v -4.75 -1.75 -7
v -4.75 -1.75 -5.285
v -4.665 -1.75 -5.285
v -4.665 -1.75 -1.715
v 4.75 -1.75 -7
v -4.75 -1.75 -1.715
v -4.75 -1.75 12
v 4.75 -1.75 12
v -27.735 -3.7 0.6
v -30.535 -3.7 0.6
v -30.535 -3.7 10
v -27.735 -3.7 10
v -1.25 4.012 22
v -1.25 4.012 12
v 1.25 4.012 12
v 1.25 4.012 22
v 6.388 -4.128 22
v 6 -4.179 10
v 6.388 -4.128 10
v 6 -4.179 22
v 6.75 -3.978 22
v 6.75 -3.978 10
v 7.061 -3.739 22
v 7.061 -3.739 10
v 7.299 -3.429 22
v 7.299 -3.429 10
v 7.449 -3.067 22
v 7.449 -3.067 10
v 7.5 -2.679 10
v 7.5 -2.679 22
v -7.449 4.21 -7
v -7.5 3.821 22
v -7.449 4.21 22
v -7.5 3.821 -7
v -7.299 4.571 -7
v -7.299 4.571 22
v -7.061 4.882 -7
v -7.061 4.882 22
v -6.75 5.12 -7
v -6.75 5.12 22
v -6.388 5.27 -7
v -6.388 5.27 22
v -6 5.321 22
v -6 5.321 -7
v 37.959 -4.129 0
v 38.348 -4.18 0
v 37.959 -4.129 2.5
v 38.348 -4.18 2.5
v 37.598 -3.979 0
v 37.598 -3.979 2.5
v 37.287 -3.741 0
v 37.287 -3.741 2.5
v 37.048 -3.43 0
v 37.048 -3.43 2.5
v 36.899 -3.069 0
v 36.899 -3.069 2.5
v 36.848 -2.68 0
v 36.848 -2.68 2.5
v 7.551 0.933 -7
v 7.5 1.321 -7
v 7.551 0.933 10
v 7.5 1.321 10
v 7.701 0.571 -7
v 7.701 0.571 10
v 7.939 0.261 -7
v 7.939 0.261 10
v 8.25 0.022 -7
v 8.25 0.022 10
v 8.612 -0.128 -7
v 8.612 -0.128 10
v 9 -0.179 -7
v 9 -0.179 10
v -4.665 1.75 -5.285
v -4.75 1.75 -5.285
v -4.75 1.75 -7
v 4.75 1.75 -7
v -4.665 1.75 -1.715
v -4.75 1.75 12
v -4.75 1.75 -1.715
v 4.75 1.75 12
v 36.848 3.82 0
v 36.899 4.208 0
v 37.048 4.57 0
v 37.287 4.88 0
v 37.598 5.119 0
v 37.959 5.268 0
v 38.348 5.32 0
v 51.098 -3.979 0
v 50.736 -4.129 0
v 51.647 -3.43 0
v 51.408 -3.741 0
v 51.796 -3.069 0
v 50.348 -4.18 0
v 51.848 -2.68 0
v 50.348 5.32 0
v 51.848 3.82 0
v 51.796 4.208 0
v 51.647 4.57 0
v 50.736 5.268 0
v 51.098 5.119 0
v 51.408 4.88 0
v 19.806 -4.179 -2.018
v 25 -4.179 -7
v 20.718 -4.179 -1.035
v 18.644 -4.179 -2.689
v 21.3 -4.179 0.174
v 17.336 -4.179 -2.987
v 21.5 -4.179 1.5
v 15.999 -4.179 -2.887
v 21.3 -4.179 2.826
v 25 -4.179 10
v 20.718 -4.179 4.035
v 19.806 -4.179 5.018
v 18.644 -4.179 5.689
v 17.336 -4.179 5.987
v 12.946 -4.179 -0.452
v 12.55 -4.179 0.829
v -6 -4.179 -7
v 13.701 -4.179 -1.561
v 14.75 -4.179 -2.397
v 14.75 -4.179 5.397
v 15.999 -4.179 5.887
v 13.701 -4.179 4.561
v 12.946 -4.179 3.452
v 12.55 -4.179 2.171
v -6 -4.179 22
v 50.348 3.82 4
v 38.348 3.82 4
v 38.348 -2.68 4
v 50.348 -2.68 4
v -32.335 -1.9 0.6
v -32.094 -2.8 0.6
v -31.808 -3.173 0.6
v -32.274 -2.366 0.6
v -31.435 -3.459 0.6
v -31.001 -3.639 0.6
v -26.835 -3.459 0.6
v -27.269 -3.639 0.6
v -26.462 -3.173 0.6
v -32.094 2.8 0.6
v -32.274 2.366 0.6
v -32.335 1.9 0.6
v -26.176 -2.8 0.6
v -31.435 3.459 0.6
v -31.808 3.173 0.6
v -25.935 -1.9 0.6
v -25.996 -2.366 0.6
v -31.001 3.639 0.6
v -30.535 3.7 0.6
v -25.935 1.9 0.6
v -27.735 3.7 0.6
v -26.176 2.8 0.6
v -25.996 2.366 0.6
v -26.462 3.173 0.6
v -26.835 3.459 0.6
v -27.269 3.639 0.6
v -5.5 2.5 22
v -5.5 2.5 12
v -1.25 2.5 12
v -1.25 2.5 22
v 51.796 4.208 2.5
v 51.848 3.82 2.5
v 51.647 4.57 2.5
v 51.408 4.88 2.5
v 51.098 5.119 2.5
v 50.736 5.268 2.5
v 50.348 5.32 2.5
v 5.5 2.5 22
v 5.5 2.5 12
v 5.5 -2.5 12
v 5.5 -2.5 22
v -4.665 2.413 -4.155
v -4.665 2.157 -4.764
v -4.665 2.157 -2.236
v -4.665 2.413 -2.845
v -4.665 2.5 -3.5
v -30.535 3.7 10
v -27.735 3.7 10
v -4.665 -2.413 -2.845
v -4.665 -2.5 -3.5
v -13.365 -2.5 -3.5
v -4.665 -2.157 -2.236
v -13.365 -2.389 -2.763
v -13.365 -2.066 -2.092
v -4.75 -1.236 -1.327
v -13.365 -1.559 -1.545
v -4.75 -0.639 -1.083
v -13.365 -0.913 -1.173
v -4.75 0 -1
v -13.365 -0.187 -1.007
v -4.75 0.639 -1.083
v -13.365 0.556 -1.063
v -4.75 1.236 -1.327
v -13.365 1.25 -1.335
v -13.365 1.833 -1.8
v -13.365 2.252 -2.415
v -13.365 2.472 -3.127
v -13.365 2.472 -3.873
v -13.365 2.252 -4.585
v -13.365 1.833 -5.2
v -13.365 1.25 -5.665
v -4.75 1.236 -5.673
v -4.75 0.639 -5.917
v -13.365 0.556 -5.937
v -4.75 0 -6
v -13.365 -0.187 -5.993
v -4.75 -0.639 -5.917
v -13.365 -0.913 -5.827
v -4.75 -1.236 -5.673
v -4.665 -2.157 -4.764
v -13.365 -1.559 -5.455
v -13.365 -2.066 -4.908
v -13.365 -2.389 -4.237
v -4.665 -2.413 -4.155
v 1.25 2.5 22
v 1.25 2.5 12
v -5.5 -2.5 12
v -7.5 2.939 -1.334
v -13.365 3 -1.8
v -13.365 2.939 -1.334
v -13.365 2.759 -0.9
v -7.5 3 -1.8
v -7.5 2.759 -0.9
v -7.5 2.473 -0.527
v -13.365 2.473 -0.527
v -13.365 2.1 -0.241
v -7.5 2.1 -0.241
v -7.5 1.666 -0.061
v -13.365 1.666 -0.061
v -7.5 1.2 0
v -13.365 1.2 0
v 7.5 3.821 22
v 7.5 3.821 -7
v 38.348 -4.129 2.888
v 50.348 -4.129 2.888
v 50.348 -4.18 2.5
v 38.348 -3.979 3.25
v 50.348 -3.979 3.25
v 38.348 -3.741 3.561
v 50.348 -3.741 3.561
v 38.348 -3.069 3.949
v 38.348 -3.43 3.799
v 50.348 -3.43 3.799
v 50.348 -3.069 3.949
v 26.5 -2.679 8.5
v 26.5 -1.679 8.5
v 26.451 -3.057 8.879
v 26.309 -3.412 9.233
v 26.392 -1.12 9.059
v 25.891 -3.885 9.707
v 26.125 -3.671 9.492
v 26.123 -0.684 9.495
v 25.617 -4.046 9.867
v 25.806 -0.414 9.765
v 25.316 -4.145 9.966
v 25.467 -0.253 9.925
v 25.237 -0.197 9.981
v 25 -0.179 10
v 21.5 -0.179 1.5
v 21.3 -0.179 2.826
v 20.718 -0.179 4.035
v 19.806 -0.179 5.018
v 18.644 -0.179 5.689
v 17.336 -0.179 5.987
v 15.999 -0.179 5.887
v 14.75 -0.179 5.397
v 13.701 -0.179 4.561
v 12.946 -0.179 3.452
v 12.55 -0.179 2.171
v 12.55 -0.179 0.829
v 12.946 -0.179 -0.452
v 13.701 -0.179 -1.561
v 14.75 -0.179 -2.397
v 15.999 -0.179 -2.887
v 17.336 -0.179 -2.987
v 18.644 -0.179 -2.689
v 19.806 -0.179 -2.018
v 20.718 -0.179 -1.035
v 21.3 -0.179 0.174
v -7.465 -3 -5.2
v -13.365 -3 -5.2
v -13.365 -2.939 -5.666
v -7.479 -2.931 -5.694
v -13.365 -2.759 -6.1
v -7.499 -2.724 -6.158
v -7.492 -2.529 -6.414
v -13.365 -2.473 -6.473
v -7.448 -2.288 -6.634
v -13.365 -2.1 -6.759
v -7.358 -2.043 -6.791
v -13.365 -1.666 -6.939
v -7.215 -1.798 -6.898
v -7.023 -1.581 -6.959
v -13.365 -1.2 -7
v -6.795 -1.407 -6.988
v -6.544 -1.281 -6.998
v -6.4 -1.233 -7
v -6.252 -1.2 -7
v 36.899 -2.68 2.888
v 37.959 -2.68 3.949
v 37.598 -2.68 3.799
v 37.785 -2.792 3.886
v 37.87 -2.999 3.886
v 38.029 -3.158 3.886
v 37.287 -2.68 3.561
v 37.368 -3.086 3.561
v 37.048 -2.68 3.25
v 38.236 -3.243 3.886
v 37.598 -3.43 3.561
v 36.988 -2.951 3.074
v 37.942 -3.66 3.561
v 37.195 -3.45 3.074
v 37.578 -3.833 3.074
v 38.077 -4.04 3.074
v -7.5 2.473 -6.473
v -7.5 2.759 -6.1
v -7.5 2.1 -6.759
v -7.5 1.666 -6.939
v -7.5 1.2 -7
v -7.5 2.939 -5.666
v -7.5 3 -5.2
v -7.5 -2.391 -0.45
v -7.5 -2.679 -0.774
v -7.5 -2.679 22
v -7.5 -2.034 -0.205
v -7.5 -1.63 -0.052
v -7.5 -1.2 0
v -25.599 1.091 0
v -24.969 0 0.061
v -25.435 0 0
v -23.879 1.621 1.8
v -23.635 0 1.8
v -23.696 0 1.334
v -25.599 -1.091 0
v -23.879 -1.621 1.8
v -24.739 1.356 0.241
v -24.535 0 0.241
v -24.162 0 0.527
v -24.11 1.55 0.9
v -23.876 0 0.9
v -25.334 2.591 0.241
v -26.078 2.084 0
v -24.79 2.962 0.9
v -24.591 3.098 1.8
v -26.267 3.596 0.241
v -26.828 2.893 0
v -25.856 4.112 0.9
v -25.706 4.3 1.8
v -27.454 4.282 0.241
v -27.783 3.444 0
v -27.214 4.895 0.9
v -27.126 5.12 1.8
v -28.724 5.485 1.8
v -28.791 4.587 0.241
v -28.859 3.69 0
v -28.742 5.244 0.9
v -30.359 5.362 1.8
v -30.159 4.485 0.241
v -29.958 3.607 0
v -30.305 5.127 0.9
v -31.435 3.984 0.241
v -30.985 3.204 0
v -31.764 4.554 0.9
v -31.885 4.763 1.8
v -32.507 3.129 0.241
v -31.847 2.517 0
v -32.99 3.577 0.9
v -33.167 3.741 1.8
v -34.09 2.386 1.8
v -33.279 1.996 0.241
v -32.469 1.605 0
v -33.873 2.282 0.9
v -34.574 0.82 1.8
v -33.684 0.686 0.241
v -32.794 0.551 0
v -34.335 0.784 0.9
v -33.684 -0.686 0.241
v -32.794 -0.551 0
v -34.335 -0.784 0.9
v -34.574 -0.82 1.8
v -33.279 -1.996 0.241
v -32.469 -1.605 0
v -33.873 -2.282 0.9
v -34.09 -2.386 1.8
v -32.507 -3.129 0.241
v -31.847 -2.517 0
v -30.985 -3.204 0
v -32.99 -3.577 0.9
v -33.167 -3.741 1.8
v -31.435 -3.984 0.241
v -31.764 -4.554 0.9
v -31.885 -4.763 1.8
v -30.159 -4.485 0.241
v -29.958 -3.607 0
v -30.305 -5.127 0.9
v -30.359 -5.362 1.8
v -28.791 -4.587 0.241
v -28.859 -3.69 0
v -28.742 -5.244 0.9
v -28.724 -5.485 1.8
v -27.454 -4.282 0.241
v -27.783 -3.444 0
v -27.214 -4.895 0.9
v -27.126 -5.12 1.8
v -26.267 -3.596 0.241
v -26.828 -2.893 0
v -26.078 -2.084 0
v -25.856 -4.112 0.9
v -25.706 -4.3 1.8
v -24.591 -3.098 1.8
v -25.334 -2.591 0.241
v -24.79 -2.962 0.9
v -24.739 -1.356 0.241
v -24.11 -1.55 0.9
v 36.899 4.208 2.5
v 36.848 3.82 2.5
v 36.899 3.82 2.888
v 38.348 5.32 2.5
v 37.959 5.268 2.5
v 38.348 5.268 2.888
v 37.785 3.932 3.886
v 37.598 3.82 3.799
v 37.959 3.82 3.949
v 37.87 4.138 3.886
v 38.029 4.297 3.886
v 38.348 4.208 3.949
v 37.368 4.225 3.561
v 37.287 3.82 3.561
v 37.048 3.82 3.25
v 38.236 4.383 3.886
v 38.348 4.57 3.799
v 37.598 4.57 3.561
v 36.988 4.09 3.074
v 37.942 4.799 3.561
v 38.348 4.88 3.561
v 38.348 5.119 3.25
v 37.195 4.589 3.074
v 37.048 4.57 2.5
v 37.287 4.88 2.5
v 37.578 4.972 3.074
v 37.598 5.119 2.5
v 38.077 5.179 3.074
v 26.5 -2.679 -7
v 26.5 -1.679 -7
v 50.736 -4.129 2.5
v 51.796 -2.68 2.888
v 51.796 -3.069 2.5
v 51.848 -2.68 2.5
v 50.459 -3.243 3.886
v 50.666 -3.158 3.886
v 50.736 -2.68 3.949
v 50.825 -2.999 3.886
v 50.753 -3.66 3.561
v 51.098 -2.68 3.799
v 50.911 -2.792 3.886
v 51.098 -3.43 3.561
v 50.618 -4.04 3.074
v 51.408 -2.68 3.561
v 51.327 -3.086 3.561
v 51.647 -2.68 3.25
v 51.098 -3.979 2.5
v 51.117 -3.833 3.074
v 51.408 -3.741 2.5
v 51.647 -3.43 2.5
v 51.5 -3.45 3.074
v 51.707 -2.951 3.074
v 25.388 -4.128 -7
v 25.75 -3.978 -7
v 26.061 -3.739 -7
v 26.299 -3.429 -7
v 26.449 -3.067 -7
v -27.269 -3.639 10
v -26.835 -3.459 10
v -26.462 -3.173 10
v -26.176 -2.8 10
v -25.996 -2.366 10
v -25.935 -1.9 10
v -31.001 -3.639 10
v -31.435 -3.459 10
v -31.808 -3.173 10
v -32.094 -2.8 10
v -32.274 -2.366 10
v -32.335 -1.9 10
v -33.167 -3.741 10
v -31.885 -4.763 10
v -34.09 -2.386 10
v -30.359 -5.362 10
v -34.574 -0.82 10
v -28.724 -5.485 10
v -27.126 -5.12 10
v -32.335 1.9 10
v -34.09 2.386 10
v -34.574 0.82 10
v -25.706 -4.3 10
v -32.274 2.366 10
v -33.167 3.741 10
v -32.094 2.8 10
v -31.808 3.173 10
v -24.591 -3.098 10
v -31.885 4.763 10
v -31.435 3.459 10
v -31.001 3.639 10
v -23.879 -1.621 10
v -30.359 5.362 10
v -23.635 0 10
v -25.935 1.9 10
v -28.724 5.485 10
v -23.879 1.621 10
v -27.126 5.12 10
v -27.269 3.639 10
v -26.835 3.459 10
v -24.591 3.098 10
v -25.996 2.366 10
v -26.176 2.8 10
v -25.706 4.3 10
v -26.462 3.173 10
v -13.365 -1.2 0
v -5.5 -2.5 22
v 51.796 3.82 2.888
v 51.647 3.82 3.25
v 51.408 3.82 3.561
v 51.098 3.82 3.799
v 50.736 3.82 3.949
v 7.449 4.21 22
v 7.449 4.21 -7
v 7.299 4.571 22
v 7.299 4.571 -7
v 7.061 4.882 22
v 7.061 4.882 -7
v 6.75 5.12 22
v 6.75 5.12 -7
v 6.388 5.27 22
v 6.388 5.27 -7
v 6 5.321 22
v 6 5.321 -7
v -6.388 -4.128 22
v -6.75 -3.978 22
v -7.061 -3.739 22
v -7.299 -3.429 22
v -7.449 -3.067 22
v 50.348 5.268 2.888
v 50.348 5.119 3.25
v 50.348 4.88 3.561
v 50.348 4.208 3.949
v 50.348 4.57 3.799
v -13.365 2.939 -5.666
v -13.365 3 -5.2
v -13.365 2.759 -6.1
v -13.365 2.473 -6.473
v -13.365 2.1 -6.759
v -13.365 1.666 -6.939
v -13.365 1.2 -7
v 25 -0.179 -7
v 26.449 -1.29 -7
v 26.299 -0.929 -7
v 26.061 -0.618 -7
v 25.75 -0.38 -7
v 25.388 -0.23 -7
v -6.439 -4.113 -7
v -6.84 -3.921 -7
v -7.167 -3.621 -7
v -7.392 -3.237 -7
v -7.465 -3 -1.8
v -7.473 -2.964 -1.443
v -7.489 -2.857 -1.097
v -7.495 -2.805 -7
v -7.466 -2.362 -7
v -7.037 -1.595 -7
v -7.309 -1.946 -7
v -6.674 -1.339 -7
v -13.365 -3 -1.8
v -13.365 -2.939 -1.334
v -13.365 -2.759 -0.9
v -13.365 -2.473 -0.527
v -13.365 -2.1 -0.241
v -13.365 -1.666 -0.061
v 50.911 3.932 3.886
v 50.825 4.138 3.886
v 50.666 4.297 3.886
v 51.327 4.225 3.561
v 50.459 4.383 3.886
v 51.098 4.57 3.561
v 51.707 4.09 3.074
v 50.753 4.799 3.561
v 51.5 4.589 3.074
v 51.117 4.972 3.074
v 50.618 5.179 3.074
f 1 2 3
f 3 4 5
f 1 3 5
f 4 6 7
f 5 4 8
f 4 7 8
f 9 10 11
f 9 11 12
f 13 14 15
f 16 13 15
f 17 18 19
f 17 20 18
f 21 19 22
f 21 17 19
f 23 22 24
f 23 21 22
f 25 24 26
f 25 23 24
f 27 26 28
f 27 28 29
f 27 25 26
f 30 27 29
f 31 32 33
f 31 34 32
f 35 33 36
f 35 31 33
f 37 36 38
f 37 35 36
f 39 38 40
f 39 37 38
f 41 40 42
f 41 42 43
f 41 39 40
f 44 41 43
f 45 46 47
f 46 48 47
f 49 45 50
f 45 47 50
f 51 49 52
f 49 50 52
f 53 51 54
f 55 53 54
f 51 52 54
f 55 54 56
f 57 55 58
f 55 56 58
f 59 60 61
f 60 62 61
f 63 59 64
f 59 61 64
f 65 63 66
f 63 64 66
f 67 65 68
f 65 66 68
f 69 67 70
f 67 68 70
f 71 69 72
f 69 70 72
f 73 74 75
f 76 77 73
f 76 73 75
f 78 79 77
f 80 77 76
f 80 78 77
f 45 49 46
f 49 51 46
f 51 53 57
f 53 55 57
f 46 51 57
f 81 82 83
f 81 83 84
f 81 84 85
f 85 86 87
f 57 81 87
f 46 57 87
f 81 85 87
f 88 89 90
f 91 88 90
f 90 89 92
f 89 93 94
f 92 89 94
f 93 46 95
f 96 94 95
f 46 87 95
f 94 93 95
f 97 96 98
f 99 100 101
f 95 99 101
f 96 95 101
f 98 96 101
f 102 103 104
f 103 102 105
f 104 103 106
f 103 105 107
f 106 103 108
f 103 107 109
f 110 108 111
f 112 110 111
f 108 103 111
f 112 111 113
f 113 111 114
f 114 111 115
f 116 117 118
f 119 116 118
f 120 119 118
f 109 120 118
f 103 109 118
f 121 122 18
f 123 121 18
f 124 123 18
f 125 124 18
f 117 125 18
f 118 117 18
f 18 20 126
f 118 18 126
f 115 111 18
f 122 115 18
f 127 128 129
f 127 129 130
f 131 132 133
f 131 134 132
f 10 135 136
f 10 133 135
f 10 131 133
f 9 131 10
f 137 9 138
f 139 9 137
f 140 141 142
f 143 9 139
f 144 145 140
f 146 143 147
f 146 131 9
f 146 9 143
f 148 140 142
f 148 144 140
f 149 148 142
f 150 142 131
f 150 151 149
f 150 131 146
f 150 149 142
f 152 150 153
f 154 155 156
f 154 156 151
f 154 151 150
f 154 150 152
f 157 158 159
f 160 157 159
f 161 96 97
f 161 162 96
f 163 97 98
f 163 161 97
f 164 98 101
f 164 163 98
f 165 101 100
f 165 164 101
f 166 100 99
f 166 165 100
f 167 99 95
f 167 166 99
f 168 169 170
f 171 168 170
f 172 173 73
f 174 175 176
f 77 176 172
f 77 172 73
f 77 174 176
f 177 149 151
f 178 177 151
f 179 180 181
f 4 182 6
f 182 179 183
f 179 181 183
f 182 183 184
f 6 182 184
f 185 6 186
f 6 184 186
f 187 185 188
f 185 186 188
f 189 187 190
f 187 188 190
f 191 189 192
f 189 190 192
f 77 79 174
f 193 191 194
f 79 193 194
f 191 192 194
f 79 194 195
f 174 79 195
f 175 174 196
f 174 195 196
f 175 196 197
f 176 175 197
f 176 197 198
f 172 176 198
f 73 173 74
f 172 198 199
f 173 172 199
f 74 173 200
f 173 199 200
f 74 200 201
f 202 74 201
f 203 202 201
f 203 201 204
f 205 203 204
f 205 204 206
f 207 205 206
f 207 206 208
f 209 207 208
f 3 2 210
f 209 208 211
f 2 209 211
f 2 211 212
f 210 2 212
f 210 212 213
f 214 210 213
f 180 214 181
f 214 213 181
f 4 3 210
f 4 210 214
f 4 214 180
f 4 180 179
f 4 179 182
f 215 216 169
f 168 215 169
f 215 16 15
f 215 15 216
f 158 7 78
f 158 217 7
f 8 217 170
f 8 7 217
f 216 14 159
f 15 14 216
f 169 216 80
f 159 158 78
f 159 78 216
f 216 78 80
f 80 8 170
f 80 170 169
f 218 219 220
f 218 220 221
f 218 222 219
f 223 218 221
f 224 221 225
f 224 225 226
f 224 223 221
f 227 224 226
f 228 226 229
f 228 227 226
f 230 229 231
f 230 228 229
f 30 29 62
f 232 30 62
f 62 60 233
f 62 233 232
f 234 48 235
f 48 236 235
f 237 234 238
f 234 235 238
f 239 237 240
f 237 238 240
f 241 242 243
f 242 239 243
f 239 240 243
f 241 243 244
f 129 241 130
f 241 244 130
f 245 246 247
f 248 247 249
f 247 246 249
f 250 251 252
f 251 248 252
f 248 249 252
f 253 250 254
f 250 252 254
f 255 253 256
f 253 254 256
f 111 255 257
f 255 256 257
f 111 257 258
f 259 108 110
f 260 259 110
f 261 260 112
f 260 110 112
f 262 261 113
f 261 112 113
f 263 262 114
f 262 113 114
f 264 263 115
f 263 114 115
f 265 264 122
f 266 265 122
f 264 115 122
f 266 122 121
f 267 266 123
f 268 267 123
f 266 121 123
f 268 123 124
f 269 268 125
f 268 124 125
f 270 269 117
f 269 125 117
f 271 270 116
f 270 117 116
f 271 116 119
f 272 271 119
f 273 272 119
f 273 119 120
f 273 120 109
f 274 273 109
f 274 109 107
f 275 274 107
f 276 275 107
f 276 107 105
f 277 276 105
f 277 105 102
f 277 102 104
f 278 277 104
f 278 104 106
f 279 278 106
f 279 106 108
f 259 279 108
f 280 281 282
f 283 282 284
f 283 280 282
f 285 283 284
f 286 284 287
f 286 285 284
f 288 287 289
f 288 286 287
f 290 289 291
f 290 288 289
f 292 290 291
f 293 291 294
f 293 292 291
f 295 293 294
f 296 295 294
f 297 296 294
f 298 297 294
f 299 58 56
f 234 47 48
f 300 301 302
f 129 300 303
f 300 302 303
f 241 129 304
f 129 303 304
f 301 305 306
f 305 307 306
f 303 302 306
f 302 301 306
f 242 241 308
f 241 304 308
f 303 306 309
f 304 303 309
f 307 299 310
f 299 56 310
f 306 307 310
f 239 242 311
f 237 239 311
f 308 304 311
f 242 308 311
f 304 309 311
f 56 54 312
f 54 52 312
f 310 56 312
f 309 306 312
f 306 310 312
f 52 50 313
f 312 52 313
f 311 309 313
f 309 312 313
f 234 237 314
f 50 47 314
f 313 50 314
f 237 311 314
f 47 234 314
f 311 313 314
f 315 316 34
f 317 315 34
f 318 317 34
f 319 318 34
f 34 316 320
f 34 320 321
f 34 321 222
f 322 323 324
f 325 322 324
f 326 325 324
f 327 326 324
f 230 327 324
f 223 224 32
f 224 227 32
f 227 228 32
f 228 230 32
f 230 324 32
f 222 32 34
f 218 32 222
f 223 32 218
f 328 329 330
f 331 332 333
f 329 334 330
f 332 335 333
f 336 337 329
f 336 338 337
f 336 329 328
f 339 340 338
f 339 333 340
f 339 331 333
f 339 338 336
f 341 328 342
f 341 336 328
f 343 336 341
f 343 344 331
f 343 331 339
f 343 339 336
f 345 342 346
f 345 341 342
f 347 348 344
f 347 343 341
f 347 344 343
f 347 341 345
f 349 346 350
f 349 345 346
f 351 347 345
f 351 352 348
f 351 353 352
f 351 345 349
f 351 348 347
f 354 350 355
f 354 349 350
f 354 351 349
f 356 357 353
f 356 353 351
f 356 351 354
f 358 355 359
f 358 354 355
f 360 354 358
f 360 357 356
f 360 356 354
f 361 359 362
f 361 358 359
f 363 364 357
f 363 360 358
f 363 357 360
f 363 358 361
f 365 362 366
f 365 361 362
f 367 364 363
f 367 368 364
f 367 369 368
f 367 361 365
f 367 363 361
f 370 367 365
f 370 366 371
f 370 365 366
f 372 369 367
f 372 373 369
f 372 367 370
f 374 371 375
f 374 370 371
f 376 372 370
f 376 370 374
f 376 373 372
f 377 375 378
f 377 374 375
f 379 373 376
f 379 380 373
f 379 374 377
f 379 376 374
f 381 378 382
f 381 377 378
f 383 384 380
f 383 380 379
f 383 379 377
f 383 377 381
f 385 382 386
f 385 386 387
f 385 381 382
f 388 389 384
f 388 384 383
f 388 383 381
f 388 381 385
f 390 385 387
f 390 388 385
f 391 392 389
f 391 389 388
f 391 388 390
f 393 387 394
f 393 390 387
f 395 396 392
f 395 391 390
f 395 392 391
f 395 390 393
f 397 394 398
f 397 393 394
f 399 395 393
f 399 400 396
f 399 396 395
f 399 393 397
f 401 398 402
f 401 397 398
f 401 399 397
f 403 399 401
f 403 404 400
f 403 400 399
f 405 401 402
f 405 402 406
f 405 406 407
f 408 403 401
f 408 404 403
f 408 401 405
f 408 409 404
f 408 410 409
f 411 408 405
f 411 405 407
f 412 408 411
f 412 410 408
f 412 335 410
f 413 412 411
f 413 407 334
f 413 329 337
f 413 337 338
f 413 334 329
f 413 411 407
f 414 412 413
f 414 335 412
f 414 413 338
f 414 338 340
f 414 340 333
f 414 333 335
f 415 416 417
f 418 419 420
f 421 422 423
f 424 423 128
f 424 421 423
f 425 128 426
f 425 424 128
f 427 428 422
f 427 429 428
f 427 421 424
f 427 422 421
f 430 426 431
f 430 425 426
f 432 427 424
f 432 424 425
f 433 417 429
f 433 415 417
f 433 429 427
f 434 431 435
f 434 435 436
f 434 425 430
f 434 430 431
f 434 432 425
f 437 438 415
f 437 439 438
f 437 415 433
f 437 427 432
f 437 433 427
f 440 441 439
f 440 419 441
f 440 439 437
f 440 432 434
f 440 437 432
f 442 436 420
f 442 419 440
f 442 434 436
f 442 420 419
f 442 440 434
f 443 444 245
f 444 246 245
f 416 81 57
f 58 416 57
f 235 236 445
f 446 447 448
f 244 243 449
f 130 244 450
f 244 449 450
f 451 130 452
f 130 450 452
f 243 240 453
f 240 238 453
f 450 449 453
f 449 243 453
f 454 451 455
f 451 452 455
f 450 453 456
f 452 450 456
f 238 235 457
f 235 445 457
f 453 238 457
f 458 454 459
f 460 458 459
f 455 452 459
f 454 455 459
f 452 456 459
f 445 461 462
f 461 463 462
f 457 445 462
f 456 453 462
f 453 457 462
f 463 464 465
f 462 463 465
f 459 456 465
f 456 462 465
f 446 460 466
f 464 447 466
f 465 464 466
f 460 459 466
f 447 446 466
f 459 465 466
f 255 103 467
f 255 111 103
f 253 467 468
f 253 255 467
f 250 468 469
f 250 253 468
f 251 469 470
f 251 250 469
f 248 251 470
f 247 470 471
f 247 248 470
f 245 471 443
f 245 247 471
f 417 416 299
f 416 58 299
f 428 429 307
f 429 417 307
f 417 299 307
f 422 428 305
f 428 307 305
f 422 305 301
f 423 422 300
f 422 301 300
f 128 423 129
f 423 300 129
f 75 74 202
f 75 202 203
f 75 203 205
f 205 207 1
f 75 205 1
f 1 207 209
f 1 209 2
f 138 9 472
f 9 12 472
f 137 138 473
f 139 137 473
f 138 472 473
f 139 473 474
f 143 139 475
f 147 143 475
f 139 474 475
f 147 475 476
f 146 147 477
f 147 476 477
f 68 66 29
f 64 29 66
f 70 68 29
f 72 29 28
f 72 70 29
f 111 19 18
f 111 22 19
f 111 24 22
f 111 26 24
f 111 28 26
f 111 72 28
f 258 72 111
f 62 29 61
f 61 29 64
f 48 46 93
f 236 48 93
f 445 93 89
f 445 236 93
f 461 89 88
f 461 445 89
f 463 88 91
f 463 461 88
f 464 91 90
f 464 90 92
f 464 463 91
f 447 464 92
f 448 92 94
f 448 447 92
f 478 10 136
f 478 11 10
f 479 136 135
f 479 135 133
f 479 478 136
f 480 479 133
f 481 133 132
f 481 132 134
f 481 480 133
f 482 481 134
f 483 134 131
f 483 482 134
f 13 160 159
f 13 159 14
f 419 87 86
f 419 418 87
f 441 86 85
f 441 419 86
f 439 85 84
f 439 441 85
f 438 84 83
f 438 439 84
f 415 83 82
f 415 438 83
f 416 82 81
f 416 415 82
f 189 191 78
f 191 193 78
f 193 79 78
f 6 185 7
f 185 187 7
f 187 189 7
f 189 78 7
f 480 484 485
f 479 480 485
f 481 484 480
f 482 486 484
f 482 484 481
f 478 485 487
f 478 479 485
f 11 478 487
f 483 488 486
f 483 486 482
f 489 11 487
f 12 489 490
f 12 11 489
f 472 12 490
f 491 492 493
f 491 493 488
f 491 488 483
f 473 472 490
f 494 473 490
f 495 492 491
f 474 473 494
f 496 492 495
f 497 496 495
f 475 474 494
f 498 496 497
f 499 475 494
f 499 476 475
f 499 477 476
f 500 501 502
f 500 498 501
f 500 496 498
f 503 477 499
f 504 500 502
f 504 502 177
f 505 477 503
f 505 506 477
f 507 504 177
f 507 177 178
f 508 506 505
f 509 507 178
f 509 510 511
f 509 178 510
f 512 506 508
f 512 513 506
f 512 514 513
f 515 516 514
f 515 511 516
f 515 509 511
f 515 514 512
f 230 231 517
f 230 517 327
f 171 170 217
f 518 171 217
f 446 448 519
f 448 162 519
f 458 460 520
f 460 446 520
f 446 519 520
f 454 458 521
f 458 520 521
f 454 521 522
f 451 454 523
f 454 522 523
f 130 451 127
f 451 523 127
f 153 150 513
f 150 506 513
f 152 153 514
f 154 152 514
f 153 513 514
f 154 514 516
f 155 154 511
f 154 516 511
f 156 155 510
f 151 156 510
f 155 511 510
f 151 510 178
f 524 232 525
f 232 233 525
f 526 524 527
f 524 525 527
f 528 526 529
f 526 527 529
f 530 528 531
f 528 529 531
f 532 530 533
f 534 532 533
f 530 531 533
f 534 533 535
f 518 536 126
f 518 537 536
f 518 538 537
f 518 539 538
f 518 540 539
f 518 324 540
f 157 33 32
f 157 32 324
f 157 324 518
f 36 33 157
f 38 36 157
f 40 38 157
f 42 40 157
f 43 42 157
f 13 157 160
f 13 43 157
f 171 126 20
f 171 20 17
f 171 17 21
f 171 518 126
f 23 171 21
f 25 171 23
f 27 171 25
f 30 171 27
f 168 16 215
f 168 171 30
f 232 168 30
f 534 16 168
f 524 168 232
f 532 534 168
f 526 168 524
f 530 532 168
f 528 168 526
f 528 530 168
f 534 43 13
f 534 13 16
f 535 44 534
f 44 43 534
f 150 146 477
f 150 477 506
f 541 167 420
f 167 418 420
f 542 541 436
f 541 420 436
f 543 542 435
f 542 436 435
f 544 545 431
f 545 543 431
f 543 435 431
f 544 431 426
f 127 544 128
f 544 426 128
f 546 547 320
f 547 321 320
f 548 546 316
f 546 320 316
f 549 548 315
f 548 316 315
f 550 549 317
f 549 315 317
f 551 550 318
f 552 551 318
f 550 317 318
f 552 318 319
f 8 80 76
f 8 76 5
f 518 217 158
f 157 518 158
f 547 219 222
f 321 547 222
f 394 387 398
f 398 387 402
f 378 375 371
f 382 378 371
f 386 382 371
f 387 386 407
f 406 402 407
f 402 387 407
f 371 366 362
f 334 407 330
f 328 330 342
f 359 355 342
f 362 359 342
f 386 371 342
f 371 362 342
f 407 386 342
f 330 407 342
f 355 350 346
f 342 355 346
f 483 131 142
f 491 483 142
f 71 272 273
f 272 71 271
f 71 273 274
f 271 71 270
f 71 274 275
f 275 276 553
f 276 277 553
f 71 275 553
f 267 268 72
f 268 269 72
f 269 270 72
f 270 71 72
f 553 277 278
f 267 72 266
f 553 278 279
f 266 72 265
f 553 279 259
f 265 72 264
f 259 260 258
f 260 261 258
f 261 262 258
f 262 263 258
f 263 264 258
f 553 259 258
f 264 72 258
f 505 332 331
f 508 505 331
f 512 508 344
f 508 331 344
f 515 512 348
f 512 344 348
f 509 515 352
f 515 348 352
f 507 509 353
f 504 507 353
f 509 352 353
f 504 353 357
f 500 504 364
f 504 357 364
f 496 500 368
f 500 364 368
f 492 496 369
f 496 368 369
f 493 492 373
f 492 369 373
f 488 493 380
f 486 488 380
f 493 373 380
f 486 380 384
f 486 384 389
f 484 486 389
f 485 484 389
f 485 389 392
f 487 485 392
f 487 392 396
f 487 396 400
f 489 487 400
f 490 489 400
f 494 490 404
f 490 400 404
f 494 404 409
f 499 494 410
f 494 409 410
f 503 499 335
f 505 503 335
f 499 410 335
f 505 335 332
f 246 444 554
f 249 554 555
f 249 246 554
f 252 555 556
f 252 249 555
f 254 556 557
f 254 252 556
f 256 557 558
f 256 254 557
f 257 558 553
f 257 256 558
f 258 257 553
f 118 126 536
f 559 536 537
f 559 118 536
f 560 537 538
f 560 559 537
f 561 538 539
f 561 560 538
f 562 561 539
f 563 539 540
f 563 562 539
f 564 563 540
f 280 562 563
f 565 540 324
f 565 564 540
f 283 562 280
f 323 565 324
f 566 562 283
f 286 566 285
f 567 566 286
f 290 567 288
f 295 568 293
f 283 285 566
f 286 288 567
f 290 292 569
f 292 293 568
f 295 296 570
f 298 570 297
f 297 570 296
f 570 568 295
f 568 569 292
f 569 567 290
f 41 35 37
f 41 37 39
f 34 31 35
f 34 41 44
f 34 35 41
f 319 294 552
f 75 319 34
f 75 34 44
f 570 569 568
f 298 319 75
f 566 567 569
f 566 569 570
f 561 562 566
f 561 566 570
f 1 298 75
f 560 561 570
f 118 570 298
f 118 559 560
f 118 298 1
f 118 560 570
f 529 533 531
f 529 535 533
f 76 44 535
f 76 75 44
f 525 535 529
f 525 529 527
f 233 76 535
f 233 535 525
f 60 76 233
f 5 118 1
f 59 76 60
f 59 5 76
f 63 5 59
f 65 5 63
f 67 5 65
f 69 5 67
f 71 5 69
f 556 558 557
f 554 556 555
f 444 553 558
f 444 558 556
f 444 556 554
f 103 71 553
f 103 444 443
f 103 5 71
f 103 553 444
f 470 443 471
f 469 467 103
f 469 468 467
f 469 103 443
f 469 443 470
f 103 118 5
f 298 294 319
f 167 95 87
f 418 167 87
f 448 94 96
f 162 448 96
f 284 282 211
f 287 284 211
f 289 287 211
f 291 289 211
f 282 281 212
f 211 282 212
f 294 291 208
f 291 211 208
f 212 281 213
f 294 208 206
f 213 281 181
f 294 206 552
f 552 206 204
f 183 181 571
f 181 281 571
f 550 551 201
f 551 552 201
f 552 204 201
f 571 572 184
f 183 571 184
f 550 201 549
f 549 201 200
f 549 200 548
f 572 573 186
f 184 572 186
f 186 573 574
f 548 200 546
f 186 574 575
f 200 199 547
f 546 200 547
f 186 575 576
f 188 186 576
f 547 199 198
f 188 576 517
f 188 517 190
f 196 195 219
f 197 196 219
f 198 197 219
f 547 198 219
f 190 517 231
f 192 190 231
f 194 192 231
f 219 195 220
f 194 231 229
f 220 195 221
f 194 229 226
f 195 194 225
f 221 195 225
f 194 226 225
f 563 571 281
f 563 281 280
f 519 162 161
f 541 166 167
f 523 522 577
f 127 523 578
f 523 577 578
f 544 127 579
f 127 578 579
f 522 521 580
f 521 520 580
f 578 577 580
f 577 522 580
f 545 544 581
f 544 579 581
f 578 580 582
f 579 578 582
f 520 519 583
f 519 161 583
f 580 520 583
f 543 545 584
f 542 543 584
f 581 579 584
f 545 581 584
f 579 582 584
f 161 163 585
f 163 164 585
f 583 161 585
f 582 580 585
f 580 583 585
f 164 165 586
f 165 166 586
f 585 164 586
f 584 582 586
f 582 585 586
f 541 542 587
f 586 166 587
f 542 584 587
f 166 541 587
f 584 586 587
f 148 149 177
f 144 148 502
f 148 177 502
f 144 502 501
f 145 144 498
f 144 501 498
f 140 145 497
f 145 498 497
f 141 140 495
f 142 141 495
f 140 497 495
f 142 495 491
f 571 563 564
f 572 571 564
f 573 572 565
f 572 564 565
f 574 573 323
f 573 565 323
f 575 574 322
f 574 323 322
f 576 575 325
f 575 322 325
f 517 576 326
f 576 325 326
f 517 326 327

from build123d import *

# Parameters (mm, degrees)
F1_DEPTH  = 22
F0_W      = 9.5
F0_H      = 3.5
F2_DEPTH  = 12
F0_W_2    = 19
F0_H_2    = 4
F3_DEPTH  = 10
F3_FACE_W = 9.5
F3_FACE_H = 3.5
F4_DEPTH  = 7
F5_R      = 4.5
F6_DEPTH  = 25
F0_W_3    = 5.865
F0_H_3    = 6
F7_DEPTH  = 7
F8_R      = 1.5
F9_R      = 1.8
F10_R     = 2.5
F11_DEPTH = 8.7
F12_R     = 5.5
F12_W     = 6.4
F12_H     = 7.4
F13_DEPTH = 10
F14_DEPTH = 0.6
F15_R     = 1.8
F17_DEPTH = 4
F18_R     = 1.5


with BuildPart() as f1:
    # F0 (on Top) → F1 (new body)
    with BuildSketch(Plane.XY):
        Polygon((-7.5, -4.178675), (7.5, -4.178675), (7.5, -0.178675), (7.5, 5.321325), (-7.5, 5.321325), (-7.5, 3), (-7.5, -3), align=None)
        Polygon((5.5, 2.5), (5.5, -2.5), (-5.5, -2.5), (-5.5, 2.5), (-1.25, 2.5), (-1.25, 4.012365), (1.25, 4.012365), (1.25, 2.5), align=None, mode=Mode.SUBTRACT)
    extrude(amount=F1_DEPTH)

    # F0 (on Top) → F2 (join)
    with BuildSketch(Plane.XY):
        Polygon((-5.5, -2.5), (5.5, -2.5), (5.5, 2.5), (1.25, 2.5), (1.25, 4.012365), (-1.25, 4.012365), (-1.25, 2.5), (-5.5, 2.5), align=None)
        Rectangle(F0_W, F0_H, mode=Mode.SUBTRACT)
    extrude(amount=F2_DEPTH)

    # F0 (on Top) → F3 (join)
    with BuildSketch(Plane.XY):
        with Locations((17, -2.178675)):
            Rectangle(F0_W_2, F0_H_2)
    extrude(amount=F3_DEPTH)

    # F3_face (on face) → F4 (join)
    with BuildSketch(Plane(origin=(6.974359, -0.454335, 0), x_dir=(1, 0, 0), z_dir=(0, 0, -1))):
        Polygon((19.525641, 3.72434), (-14.474359, 3.72434), (-14.474359, -5.77566), (0.525641, -5.77566), (0.525641, -0.27566), (19.525641, -0.27566), align=None)
        with Locations((-6.974359, -0.454335)):
            Rectangle(F3_FACE_W, F3_FACE_H, mode=Mode.SUBTRACT)
    extrude(amount=F4_DEPTH)

    # F5 (on face) → F6 (cut)
    with BuildSketch(Plane.XZ.offset(4.178675)):
        with Locations((17, 1.5)):
            Circle(F5_R)
    extrude(amount=-F6_DEPTH, mode=Mode.SUBTRACT)

    # F0 (on Top) → F7 (join)
    with BuildSketch(Plane.XY):
        with Locations((-10.4325, 0)):
            Rectangle(F0_W_3, F0_H_3)
    extrude(amount=-F7_DEPTH)

    # F8
    f8_edges = [f1.edges().sort_by_distance(p)[0] for p in [
        (-7.5, 5.321325, 7.5),
        (7.5, 5.321325, 7.5),
        (7.5, -4.178675, 16),
        (-7.5, -4.178675, 7.5),
        (26.5, -4.178675, 1.5),
        (26.5, -0.178675, 1.5),
        (7.5, -0.178675, 1.5),
        (26.5, -2.178675, 10),
    ]]
    fillet(f8_edges, radius=F8_R)

    # F9
    f9_edges = [f1.edges().sort_by_distance(p)[0] for p in [
        (-10.4325, 3, -7),
        (-10.41509, -3, -7),
        (-10.41509, -3, 0),
        (-10.4325, 3, 0),
    ]]
    fillet(f9_edges, radius=F9_R)

    # F10 (on face) → F11 (cut)
    with BuildSketch(Plane(origin=(-13.365, 0, 0), x_dir=(0, -1, 0), z_dir=(-1, 0, 0))):
        with Locations((0, -3.5)):
            Circle(F10_R)
    extrude(amount=-F11_DEPTH, mode=Mode.SUBTRACT)


with BuildPart() as f13:
    # F12 (on Top) → F13 (new body)
    with BuildSketch(Plane.XY):
        with Locations((-29.135002, 0)):
            Circle(F12_R)
        with Locations((-29.135002, 0)):
            Rectangle(F12_W, F12_H, mode=Mode.SUBTRACT)
    extrude(amount=F13_DEPTH)

    # F12 (on Top) → F14 (join)
    with BuildSketch(Plane.XY):
        with Locations((-29.135002, 0)):
            Rectangle(F12_W, F12_H)
    extrude(amount=F14_DEPTH)

    # F15
    f15_edges = [f13.edges().sort_by_distance(p)[0] for p in [
        (-25.935002, 3.7, 5.3),
        (-32.335002, 3.7, 5.3),
        (-34.635002, 0, 0),
        (-25.935002, -3.7, 5.3),
        (-32.335002, -3.7, 5.3),
    ]]
    fillet(f15_edges, radius=F15_R)


with BuildPart() as f17:
    # F16 (on Top) → F17 (new body)
    with BuildSketch(Plane.XY):
        Polygon((36.847512, -4.18044), (51.847512, -4.18044), (51.847512, -0.18044), (51.847512, 5.31956), (36.847512, 5.31956), (36.847512, 2.998235), (36.847512, -3.001765), align=None)
    extrude(amount=F17_DEPTH)

    # F18
    f18_edges = [f17.edges().sort_by_distance(p)[0] for p in [
        (51.847512, -4.18044, 2),
        (36.847512, -4.18044, 2),
        (36.847512, 5.31956, 2),
        (51.847512, 5.31956, 2),
        (36.847512, 0.56956, 4),
        (44.347512, -4.18044, 4),
        (51.847512, 0.56956, 4),
        (44.347512, 5.31956, 4),
    ]]
    fillet(f18_edges, radius=F18_R)


solid = Compound([f1.part, f13.part, f17.part])
